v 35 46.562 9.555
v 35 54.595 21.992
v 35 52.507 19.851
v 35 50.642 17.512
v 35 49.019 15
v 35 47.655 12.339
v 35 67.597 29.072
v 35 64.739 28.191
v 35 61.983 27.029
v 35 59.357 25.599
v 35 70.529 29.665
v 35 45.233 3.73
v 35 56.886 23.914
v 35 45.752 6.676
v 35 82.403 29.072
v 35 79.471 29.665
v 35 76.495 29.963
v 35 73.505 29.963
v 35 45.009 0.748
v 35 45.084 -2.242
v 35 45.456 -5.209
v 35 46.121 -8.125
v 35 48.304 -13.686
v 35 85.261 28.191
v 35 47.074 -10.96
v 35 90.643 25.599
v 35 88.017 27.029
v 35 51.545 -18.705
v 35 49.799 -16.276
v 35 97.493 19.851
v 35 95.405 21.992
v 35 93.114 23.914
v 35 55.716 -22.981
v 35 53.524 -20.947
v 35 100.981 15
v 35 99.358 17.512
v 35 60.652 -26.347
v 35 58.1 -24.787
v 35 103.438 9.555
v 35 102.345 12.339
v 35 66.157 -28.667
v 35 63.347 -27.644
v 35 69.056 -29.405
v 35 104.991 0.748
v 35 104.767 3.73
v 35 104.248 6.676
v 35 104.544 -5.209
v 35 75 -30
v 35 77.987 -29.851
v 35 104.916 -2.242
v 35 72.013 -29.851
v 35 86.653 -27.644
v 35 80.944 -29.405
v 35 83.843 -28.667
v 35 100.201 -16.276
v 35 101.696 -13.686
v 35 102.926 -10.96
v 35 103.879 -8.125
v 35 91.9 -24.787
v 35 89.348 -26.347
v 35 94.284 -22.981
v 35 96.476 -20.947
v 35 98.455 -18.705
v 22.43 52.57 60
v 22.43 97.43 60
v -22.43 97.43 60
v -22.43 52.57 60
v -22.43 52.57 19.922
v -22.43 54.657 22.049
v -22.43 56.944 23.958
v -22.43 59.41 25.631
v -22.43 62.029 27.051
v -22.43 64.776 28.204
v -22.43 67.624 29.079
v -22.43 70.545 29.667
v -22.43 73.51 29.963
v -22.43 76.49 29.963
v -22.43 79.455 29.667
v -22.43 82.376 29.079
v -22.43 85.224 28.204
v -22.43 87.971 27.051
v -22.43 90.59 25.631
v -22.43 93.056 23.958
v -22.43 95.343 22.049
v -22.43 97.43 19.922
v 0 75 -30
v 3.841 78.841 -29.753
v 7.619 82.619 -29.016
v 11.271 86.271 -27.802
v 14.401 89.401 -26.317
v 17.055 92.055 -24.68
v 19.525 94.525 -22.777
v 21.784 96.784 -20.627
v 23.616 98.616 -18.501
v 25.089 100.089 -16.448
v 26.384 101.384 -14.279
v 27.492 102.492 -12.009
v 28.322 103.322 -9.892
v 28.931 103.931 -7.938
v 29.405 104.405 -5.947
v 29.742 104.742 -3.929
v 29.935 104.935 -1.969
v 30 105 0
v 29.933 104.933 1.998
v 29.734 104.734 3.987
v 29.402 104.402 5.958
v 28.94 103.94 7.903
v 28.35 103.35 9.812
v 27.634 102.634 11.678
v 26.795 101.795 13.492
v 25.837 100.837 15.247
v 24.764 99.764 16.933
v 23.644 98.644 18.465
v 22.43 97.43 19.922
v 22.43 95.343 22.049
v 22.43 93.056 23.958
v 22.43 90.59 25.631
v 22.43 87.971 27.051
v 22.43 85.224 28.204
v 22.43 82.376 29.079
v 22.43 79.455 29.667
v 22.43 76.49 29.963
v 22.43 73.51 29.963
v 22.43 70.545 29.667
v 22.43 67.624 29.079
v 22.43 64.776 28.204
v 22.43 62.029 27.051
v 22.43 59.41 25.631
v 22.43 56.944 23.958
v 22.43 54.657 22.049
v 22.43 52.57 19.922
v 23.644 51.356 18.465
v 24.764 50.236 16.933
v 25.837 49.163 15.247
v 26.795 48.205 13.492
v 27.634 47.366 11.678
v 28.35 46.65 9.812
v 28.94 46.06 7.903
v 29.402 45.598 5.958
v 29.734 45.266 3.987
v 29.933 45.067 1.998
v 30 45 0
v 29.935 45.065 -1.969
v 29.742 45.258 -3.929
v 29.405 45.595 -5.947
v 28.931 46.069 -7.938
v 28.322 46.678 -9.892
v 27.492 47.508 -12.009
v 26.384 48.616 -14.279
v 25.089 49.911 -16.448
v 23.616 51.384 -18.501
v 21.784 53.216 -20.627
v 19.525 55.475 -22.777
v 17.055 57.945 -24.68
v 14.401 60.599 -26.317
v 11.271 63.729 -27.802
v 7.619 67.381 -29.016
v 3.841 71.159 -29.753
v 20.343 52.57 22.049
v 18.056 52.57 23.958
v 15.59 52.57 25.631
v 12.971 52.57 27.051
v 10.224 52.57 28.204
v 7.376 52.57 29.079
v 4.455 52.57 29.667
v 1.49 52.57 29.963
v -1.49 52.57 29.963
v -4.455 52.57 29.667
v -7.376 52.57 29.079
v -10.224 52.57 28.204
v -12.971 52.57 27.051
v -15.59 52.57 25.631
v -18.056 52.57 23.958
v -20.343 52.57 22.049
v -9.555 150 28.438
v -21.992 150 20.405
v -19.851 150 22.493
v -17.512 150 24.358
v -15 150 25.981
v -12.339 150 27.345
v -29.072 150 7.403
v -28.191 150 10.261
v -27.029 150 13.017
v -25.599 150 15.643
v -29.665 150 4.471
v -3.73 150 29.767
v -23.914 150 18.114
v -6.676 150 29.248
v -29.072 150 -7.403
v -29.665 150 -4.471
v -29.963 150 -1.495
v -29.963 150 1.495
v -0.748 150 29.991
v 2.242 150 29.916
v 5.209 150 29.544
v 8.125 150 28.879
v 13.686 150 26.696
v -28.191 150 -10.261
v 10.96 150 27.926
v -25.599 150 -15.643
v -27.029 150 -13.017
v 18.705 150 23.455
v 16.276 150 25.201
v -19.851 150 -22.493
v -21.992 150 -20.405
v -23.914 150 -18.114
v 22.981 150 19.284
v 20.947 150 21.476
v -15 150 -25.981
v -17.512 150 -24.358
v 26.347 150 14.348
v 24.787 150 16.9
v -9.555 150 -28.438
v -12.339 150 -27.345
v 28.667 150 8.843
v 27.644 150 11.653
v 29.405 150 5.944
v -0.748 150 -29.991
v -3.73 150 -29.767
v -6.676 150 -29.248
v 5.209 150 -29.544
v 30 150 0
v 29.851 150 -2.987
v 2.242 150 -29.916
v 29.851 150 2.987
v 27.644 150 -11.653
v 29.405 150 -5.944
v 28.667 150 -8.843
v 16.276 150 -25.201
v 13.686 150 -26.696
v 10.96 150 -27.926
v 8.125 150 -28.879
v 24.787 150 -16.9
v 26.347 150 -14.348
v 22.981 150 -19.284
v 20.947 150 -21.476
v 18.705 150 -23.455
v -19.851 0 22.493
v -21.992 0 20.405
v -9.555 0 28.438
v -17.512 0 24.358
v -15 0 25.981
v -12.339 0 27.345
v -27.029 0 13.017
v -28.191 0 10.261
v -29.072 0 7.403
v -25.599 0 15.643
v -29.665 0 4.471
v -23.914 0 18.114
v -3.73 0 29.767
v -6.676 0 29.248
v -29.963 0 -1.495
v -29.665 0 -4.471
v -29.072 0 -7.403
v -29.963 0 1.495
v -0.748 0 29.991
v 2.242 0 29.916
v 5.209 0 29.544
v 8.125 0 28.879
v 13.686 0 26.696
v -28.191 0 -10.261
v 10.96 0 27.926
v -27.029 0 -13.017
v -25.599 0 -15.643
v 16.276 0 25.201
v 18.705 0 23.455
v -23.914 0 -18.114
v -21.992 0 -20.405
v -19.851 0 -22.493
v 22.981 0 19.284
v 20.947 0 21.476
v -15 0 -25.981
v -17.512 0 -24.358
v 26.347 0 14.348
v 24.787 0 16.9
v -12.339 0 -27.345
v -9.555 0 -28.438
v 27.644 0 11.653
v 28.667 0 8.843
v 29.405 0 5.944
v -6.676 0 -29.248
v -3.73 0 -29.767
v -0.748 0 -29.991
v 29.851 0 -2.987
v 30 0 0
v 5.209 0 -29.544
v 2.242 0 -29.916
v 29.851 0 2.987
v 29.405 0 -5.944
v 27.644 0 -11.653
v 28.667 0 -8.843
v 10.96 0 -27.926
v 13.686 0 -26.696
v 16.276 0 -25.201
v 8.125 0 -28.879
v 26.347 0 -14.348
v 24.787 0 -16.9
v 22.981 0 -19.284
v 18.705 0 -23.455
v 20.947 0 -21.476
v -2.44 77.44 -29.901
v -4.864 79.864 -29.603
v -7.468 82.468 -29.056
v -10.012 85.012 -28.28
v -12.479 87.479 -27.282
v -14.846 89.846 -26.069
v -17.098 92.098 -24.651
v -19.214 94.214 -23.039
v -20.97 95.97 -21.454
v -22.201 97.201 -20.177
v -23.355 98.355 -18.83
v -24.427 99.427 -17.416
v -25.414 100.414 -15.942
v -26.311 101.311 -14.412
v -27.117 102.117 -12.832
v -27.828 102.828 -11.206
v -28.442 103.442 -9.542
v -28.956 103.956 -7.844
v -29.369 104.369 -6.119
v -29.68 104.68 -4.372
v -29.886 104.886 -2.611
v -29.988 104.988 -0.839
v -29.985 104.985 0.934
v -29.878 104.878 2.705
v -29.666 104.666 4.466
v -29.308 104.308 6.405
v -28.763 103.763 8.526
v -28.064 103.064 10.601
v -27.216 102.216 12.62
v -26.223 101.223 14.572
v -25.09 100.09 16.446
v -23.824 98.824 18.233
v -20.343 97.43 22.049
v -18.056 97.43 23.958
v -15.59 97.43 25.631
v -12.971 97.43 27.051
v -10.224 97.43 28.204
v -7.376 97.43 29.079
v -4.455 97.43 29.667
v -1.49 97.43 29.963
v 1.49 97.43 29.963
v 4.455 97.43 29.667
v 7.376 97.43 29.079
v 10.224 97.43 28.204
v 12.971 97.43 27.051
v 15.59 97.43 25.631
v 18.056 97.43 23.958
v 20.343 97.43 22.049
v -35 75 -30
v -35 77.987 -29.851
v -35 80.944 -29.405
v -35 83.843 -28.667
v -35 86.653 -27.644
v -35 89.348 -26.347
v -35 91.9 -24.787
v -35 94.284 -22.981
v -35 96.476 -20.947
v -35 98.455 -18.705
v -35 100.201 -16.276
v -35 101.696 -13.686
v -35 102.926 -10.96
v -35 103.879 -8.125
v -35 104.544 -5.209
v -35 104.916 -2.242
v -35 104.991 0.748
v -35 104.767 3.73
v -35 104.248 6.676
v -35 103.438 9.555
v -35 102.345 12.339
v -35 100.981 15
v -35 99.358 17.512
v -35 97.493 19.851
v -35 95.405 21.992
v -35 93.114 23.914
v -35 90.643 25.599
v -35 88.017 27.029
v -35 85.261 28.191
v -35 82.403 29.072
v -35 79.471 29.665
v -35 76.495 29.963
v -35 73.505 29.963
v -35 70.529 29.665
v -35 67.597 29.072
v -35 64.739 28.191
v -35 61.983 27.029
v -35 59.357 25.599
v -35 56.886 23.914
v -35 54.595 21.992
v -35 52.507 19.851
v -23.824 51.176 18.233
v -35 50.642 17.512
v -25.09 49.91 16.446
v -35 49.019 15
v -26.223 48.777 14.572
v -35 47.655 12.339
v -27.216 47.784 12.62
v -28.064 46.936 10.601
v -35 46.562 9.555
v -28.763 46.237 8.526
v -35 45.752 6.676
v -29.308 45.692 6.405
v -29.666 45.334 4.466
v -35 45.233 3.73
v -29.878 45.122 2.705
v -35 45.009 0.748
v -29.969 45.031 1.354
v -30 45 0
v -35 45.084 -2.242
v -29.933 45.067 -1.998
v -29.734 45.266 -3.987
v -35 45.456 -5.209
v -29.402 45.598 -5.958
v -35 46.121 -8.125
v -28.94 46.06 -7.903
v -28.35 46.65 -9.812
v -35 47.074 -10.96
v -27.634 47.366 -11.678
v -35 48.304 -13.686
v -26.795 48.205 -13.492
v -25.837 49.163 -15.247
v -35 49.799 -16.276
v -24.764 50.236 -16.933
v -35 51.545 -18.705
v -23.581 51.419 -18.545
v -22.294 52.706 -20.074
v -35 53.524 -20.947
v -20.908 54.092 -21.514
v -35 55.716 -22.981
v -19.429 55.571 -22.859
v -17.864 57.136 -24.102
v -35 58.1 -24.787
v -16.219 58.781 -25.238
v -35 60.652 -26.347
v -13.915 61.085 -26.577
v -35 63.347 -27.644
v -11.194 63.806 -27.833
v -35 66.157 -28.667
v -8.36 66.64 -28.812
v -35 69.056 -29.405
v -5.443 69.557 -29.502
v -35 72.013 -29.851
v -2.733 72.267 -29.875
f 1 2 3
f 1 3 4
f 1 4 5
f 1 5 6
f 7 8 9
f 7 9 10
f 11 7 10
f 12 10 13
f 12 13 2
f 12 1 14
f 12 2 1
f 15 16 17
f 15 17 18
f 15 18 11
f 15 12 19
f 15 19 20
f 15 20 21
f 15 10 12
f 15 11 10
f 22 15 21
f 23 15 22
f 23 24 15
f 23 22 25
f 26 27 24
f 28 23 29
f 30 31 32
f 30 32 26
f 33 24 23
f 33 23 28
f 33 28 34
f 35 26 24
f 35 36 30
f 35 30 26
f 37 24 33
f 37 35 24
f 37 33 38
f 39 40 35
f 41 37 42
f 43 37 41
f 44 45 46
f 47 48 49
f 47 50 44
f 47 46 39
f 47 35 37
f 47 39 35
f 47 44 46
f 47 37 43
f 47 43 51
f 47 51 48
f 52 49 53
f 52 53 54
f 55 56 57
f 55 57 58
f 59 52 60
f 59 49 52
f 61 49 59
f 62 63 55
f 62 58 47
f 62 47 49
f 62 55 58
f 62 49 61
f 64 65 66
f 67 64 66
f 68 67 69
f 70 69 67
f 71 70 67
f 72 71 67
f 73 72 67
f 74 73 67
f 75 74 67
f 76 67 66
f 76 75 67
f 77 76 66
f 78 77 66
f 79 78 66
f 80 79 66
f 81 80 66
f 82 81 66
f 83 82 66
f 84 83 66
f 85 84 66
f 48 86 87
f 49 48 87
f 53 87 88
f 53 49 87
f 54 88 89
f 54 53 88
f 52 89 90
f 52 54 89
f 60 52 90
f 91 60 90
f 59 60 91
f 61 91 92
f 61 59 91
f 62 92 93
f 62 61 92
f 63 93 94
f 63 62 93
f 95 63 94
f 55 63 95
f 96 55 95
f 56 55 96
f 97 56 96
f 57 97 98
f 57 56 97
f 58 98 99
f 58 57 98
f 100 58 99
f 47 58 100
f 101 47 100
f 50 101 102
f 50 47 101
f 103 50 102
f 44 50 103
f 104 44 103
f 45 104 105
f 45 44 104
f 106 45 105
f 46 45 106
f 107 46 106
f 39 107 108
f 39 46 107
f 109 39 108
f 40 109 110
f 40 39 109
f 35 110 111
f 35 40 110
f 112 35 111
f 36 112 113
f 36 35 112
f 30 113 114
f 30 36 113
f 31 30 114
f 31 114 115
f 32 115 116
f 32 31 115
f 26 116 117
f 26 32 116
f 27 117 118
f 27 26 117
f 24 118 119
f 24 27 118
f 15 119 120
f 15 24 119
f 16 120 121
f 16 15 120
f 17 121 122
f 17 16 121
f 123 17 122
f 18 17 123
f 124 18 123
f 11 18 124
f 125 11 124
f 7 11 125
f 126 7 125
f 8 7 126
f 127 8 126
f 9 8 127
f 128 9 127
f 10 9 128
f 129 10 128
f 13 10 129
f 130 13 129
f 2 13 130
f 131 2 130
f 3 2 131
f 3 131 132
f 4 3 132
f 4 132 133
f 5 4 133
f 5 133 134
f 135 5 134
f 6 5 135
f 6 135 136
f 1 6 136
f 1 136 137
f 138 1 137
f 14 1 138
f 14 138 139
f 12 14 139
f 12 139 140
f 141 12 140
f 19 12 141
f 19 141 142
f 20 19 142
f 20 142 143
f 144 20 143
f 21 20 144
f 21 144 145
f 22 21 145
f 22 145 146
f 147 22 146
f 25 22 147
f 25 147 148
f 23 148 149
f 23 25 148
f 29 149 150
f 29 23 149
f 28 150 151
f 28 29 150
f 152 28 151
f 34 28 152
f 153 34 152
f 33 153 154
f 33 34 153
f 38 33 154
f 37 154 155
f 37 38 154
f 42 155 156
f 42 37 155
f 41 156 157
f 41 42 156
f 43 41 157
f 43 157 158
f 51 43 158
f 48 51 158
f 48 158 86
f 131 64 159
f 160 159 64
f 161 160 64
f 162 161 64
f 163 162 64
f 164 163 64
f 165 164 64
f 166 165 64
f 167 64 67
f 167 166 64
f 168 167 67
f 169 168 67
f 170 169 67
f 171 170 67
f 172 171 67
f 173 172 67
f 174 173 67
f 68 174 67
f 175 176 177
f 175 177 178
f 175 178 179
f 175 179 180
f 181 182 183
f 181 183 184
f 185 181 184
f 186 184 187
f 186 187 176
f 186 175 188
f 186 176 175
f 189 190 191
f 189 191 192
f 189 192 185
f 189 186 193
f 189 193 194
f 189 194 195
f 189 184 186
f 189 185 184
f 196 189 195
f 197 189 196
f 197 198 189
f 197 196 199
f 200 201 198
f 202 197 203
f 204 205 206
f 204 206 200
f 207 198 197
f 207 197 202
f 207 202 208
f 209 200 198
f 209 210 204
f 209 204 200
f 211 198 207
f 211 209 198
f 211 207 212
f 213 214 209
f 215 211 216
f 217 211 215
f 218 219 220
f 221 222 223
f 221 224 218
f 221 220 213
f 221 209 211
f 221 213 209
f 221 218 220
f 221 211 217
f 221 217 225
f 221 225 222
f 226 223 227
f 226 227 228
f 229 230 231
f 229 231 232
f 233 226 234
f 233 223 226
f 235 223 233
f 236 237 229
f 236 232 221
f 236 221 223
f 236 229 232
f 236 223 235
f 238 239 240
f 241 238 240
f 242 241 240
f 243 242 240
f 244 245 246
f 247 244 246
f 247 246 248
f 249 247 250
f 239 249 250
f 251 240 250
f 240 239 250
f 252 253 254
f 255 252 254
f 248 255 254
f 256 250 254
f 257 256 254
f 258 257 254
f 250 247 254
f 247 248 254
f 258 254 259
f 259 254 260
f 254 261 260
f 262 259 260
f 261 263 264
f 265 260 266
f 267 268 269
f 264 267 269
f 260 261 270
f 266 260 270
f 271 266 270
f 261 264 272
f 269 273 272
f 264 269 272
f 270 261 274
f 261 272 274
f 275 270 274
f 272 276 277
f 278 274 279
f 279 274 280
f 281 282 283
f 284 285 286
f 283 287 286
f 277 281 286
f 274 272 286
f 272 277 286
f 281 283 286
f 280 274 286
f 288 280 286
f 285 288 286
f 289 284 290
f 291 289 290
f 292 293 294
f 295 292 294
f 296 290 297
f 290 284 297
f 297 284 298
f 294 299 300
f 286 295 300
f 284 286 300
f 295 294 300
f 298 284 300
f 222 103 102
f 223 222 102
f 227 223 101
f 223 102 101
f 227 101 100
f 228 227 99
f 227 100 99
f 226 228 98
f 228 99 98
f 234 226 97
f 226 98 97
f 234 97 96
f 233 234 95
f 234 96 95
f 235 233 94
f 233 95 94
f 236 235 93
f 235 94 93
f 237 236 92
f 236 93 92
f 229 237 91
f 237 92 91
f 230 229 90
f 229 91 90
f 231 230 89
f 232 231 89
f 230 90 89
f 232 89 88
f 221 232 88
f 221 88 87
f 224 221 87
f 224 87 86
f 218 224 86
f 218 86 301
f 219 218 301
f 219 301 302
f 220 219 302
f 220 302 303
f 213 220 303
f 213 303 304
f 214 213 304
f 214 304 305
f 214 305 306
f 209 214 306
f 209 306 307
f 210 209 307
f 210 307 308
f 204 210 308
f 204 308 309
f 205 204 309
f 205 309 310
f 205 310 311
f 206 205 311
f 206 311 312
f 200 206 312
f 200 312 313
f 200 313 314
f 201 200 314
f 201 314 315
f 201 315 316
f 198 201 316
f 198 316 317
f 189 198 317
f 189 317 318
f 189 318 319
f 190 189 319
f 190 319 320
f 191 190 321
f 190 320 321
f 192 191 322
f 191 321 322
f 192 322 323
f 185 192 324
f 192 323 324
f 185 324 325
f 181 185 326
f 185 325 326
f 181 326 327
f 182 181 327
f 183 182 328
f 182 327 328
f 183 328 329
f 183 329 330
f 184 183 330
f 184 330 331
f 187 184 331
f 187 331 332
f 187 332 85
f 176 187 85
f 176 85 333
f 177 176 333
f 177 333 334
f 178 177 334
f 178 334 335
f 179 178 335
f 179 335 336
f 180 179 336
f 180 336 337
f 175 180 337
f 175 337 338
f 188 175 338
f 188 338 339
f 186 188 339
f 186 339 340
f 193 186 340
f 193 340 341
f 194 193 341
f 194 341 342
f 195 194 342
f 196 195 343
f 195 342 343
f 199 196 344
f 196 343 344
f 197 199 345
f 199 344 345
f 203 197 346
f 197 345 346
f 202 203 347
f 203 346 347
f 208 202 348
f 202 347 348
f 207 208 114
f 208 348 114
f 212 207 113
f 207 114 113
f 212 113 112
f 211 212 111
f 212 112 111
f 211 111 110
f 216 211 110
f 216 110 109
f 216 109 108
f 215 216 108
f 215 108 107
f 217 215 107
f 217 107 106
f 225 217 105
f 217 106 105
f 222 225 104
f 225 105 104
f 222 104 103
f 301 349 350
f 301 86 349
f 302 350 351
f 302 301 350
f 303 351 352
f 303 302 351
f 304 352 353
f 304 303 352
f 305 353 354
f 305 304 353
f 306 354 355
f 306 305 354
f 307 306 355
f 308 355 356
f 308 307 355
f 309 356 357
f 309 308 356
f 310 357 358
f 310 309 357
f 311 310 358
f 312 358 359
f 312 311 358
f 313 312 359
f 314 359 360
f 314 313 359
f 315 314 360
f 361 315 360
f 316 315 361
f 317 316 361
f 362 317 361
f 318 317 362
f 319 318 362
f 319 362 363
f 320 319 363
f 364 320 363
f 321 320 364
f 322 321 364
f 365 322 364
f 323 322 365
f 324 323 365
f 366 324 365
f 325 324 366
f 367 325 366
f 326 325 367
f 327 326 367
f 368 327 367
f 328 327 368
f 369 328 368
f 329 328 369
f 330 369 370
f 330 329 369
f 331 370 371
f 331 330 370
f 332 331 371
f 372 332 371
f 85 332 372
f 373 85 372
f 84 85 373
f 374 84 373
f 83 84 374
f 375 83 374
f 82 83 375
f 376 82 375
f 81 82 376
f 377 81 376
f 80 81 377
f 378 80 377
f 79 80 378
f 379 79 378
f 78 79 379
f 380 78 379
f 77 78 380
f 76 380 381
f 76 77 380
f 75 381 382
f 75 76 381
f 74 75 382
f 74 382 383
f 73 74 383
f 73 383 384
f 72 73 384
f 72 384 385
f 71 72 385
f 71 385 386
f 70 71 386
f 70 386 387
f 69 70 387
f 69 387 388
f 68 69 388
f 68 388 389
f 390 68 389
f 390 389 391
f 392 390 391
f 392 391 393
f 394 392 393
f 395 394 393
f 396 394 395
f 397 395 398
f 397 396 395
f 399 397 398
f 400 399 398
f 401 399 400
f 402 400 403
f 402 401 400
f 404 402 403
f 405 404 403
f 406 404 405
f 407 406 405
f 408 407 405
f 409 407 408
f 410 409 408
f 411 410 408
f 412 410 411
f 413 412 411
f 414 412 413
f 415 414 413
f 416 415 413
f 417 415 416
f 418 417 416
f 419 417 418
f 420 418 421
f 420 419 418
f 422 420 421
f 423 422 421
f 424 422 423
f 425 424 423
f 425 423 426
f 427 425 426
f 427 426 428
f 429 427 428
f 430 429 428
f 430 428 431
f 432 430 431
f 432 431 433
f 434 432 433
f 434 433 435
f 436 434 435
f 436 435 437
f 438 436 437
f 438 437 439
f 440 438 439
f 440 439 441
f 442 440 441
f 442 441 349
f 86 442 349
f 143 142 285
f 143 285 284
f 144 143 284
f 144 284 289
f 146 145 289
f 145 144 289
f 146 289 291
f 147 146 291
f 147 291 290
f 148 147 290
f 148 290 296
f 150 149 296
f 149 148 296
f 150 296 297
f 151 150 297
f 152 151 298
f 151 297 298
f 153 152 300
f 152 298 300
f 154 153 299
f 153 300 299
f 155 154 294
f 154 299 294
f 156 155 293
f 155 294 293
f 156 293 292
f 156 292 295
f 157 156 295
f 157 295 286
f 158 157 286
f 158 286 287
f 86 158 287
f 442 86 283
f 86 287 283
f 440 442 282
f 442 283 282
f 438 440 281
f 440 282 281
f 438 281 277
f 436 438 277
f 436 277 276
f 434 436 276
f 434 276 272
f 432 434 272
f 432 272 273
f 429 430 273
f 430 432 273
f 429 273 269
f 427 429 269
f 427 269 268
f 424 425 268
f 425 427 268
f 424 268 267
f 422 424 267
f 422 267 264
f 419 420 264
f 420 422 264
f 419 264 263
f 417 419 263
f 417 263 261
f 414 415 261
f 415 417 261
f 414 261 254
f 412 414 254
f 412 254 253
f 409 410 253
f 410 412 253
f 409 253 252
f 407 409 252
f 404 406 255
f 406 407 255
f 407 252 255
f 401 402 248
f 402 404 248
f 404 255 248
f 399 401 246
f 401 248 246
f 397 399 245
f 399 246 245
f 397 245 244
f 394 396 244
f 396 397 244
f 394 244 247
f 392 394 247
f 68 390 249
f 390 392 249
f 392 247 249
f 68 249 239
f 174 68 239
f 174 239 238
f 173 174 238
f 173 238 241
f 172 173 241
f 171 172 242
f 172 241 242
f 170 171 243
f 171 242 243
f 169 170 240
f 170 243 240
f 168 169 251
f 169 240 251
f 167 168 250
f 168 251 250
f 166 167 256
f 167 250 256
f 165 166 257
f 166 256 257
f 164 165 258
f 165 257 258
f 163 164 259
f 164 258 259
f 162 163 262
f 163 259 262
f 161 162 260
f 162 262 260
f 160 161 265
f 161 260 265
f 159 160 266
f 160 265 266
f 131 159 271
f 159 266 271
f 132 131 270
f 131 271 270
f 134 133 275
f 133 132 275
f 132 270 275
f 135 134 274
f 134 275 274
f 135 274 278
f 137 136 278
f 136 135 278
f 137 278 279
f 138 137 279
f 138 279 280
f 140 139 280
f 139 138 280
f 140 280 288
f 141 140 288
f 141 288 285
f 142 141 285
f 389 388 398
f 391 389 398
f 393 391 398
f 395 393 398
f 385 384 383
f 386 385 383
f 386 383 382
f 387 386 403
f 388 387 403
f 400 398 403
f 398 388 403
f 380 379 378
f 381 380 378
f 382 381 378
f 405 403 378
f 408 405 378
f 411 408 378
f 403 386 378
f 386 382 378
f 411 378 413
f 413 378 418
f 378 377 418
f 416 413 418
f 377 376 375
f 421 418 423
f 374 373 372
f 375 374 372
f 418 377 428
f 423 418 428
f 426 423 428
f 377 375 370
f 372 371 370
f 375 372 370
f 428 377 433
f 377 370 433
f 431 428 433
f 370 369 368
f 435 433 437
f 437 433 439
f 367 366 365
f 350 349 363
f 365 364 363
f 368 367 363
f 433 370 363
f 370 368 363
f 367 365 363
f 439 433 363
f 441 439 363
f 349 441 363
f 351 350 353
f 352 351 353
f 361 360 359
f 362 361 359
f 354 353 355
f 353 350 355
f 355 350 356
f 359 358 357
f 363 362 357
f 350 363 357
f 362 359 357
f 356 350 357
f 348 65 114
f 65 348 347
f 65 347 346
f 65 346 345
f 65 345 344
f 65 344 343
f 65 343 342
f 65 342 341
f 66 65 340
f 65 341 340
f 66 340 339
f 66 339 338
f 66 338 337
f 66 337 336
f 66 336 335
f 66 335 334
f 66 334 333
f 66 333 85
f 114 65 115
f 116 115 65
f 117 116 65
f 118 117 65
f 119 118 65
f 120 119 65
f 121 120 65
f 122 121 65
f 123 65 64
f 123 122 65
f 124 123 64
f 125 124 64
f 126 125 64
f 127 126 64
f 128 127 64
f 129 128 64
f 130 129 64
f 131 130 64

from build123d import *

# Parameters (mm, degrees)
SKETCH1_R           = 30
BOSS_EXTRUDE1_DEPTH = 150
SKETCH3_R           = 30
BOSS_EXTRUDE2_DEPTH = 35
BOSS_EXTRUDE3_DEPTH = 60


with BuildPart() as part:
    # Sketch1 → Boss-Extrude1 (new body)
    with BuildSketch(Plane(origin=(0, 0, 0), x_dir=(1, 0, 0), z_dir=(0, 1, 0))):
        Circle(SKETCH1_R)
    extrude(amount=BOSS_EXTRUDE1_DEPTH)

    # Sketch3 → Boss-Extrude2 (add, symmetric)
    with BuildSketch(Plane(origin=(0, 0, 0), x_dir=(0, 0, -1), z_dir=(1, 0, 0))):
        with Locations((0, 75)):
            Circle(SKETCH3_R)
    extrude(amount=BOSS_EXTRUDE2_DEPTH, both=True)

    # Sketch4 → Boss-Extrude3 (add)
    with BuildSketch(Plane.XY):
        Polygon((0, 97.430213505), (22.430213505, 97.430213505), (22.430213505, 52.569786495), (-22.430213505, 52.569786495), (-22.430213505, 97.430213505), align=None)
    extrude(amount=BOSS_EXTRUDE3_DEPTH)


solid = part.part
